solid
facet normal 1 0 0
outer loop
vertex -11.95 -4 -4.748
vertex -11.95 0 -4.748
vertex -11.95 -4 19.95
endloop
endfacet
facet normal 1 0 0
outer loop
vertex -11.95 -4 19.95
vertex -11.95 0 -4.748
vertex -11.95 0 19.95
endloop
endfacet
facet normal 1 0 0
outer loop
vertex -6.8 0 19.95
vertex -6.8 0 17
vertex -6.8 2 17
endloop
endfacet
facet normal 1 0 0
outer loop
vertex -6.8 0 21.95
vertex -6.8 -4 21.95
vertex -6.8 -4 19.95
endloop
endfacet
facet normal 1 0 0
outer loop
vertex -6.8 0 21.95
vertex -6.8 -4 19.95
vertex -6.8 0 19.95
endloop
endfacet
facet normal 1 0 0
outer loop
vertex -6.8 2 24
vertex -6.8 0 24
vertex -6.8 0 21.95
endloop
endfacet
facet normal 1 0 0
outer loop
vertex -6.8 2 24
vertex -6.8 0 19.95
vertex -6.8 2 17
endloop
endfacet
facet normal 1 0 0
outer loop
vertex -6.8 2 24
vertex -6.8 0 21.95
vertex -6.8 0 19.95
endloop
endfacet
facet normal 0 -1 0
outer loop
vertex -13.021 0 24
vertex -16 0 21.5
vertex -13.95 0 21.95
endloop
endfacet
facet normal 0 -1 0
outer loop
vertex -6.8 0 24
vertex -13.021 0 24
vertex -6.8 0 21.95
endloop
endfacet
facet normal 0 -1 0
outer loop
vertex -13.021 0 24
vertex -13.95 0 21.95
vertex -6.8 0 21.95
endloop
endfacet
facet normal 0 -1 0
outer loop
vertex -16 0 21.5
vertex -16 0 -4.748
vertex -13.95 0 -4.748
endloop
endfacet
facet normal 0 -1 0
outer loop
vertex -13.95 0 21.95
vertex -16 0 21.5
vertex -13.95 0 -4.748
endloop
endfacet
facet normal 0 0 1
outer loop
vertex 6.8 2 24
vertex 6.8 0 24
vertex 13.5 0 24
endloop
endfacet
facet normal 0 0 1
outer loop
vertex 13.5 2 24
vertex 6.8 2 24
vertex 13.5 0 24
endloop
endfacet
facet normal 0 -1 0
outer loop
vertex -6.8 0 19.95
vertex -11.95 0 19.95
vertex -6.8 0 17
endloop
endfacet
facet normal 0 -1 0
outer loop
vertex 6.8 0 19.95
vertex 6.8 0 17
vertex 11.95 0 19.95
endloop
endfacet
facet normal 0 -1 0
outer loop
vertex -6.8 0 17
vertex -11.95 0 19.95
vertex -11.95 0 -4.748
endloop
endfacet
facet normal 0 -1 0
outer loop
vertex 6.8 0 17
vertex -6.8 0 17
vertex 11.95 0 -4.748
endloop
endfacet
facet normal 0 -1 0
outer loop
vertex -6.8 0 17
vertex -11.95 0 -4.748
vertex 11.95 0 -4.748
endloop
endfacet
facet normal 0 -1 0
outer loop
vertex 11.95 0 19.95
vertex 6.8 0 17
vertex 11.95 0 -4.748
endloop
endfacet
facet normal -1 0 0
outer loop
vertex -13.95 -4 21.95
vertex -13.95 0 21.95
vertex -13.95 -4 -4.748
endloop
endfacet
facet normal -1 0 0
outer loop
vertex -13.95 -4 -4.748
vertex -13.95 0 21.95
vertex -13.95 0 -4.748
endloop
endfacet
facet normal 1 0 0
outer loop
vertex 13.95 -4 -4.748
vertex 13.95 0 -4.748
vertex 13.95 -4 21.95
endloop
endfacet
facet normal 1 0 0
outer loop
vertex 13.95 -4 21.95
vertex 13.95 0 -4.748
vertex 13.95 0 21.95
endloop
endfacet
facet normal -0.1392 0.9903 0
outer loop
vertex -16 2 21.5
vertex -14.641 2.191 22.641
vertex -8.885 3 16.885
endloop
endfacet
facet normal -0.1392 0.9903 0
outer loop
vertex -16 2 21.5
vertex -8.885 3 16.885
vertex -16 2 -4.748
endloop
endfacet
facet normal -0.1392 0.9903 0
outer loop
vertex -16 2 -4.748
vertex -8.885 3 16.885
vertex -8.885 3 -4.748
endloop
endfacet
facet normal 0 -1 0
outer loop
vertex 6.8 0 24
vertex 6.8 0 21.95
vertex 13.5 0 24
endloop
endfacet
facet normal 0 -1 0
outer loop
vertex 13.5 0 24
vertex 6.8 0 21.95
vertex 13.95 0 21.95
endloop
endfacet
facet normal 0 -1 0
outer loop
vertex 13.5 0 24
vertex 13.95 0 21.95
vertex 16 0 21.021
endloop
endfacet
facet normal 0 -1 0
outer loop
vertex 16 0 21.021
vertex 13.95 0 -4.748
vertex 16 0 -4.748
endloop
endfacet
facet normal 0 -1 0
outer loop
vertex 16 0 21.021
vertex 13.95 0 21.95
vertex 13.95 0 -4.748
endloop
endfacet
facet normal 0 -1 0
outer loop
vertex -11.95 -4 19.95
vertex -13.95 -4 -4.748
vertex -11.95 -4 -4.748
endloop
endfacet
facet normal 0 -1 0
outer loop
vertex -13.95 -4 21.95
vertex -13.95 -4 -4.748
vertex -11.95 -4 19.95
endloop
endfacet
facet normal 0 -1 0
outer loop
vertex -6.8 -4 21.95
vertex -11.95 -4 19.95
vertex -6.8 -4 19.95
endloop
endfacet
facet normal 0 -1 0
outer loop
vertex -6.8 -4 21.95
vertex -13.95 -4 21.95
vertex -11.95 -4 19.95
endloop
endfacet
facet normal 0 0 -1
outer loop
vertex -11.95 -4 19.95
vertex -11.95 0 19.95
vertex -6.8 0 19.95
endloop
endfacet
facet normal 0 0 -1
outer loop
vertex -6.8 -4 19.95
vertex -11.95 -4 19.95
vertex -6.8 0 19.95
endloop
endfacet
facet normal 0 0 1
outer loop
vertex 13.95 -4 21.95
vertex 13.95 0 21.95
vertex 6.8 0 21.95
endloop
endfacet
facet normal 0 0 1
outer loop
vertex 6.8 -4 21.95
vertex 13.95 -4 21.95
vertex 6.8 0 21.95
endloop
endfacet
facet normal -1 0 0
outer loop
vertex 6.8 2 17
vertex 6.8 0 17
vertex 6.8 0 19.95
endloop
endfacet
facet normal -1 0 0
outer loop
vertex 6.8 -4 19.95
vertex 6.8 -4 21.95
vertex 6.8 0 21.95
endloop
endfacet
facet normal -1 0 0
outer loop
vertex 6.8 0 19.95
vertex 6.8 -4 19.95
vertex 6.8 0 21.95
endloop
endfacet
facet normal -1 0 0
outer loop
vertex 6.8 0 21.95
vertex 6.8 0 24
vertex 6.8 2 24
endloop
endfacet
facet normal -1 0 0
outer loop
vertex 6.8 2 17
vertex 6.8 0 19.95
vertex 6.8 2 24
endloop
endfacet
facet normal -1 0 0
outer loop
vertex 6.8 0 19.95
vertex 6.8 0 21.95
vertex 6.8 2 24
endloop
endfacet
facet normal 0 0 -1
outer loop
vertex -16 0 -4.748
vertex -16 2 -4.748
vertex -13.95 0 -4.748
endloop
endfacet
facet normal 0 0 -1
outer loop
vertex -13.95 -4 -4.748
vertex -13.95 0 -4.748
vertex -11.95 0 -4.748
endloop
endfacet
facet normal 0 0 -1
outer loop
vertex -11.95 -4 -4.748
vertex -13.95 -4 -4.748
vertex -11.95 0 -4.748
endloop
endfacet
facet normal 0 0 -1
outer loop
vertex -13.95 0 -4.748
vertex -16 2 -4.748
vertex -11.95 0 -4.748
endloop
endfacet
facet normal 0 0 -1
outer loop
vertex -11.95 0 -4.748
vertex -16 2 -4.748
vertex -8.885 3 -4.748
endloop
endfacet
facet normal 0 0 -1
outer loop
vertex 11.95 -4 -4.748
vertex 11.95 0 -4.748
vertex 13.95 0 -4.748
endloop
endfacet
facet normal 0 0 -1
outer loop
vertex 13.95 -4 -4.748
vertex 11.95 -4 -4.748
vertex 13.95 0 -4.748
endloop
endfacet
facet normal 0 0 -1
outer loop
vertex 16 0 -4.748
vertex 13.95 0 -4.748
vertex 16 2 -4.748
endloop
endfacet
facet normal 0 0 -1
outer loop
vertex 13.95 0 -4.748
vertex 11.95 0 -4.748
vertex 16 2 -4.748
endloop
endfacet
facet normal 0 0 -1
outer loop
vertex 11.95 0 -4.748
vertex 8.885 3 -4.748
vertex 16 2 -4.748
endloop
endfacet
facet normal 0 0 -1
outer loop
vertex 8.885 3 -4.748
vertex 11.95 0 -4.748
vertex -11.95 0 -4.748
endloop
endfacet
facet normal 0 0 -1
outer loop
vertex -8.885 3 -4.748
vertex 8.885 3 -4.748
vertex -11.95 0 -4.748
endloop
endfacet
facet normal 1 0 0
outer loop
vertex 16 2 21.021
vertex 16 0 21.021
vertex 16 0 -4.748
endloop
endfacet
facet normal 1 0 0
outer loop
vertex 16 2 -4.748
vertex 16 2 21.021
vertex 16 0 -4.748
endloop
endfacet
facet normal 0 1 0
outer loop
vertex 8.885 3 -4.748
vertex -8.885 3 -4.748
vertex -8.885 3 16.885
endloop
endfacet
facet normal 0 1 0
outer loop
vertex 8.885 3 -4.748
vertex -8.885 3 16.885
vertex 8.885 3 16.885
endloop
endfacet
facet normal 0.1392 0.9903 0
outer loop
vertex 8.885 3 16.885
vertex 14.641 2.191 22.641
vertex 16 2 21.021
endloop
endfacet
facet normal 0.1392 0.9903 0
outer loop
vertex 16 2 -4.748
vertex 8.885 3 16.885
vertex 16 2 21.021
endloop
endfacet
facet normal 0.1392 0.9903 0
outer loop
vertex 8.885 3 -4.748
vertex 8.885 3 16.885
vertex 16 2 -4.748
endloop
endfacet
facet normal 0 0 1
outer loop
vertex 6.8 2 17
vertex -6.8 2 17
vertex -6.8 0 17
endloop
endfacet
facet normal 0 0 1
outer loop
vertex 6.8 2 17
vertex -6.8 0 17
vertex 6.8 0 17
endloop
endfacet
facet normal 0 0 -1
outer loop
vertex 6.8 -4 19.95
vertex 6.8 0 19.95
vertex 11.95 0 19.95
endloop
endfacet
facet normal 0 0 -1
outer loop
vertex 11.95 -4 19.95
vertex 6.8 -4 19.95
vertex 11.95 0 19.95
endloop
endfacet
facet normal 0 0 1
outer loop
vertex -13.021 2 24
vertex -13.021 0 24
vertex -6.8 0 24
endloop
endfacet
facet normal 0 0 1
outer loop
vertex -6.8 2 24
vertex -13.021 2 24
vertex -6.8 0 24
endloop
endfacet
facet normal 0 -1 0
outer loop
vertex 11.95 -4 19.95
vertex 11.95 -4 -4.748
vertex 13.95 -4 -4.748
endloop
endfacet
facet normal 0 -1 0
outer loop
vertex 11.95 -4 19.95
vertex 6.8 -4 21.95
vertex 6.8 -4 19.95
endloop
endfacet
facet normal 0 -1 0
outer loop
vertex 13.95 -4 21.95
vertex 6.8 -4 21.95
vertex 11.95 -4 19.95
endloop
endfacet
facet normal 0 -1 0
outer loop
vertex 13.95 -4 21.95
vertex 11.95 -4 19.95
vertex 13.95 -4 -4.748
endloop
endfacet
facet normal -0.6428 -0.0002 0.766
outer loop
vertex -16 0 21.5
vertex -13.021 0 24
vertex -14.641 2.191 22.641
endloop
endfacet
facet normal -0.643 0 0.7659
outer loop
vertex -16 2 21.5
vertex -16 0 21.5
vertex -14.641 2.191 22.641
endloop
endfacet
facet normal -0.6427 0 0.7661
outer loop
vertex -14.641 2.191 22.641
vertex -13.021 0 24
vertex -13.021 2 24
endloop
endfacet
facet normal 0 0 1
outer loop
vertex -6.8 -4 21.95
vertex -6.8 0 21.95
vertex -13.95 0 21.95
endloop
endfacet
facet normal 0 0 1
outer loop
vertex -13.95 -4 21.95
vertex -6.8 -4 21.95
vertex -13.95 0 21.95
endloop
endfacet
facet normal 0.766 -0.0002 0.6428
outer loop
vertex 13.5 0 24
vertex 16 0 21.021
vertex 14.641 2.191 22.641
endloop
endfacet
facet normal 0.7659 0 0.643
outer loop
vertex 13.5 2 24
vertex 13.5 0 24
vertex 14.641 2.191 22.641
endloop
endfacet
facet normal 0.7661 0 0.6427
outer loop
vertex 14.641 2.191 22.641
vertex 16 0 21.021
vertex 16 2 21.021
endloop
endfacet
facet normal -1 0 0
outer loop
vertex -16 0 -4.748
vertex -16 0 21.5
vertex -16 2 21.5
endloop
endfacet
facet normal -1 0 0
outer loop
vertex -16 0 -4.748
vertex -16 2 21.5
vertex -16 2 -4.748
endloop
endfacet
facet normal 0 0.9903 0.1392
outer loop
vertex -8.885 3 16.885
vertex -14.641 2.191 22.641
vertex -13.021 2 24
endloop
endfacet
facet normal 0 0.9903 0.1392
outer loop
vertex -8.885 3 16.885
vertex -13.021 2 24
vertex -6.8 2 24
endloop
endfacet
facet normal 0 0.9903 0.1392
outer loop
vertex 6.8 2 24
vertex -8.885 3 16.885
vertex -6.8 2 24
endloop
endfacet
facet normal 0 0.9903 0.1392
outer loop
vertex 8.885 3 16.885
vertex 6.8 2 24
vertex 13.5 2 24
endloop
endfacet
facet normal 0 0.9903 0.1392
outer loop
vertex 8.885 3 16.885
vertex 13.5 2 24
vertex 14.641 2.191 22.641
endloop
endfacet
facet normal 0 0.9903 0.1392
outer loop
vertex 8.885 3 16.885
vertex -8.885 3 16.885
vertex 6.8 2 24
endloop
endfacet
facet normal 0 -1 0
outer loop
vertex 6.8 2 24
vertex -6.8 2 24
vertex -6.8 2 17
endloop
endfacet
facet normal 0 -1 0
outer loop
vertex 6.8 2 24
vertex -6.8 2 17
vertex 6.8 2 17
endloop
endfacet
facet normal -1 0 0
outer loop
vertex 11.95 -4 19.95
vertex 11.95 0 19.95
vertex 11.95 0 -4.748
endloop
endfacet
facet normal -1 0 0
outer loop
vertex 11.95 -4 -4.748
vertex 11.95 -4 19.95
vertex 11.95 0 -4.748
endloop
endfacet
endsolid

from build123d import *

# Parameters (mm, degrees)
SKETCH1_W             = 32
SKETCH1_H             = 48
BOSS_EXTRUDE1_DEPTH   = 3
BOSS_EXTRUDE2_DEPTH   = 4
CHAMFER1_SIZE         = 1
CHAMFER1_SIZE2        = 7.115369722
CHAMFER1_PART_2_SIZE  = 1
CHAMFER1_PART_2_SIZE2 = 7.115369722
CHAMFER2_SIZE         = 1
CHAMFER2_SIZE2        = 7.115369722
CHAMFER2_PART_2_SIZE  = 1
CHAMFER2_PART_2_SIZE2 = 7.115369722
SKETCH4_W             = 13.6
SKETCH4_H             = 2
CUT_EXTRUDE2_DEPTH    = 7
CHAMFER4_SIZE         = 2.5
CHAMFER4_SIZE2        = 2.979383981
CHAMFER4_PART_2_SIZE  = 2.5
CHAMFER4_PART_2_SIZE2 = 2.979383981
CHAMFER5_SIZE         = 2.5
SKETCH5_W             = 45.346149297
SKETCH5_H             = 21.744132288
CUT_EXTRUDE3_DEPTH    = 10


with BuildPart() as part:
    # Sketch1 → Boss-Extrude1 (new body)
    with BuildSketch(Plane(origin=(0, 0, 0), x_dir=(1, 0, 0), z_dir=(0, 1, 0))):
        Rectangle(SKETCH1_W, SKETCH1_H)
    extrude(amount=BOSS_EXTRUDE1_DEPTH)

    # Sketch2 → Boss-Extrude2 (add)
    with BuildSketch(Plane.XZ):
        Polygon((-13.95, -21.95), (-11.95, -21.95), (-11.95, -19.95), (-11.95, 19.95), (-6.8, 19.95), (-6.8, 21.95), (-13.95, 21.95), align=None)
        Polygon((11.95, -19.95), (11.95, -21.95), (13.95, -21.95), (13.95, 21.95), (6.8, 21.95), (6.8, 19.95), (11.95, 19.95), align=None)
    extrude(amount=BOSS_EXTRUDE2_DEPTH)

    # Chamfer1
    chamfer1_edges = [part.edges().sort_by_distance(p)[0] for p in [
        (0, 3, 24),
    ]]
    chamfer1_side = [part.faces().sort_by_distance(p)[0] for p in [
        (0, 1.5, 24),
    ]]
    chamfer(chamfer1_edges, length=CHAMFER1_SIZE, length2=CHAMFER1_SIZE2, reference=chamfer1_side[0])

    # Chamfer1 part 2
    chamfer1_part_2_edges = [part.edges().sort_by_distance(p)[0] for p in [
        (0, 3, -24),
    ]]
    chamfer1_part_2_side = [part.faces().sort_by_distance(p)[0] for p in [
        (0, 1.5, -24),
    ]]
    chamfer(chamfer1_part_2_edges, length=CHAMFER1_PART_2_SIZE, length2=CHAMFER1_PART_2_SIZE2, reference=chamfer1_part_2_side[0])

    # Chamfer2
    chamfer2_edges = [part.edges().sort_by_distance(p)[0] for p in [
        (16, 3, 0),
    ]]
    chamfer2_side = [part.faces().sort_by_distance(p)[0] for p in [
        (16, 1.439355758, 0),
    ]]
    chamfer(chamfer2_edges, length=CHAMFER2_SIZE, length2=CHAMFER2_SIZE2, reference=chamfer2_side[0])

    # Chamfer2 part 2
    chamfer2_part_2_edges = [part.edges().sort_by_distance(p)[0] for p in [
        (-16, 3, 0),
    ]]
    chamfer2_part_2_side = [part.faces().sort_by_distance(p)[0] for p in [
        (-16, 1.439355758, 0),
    ]]
    chamfer(chamfer2_part_2_edges, length=CHAMFER2_PART_2_SIZE, length2=CHAMFER2_PART_2_SIZE2, reference=chamfer2_part_2_side[0])

    # Sketch4 → Cut-Extrude2 (cut)
    with BuildSketch(Plane.XY.offset(24)):
        with Locations((0, 1)):
            Rectangle(SKETCH4_W, SKETCH4_H)
    extrude(amount=-CUT_EXTRUDE2_DEPTH, mode=Mode.SUBTRACT)

    # Chamfer4
    chamfer4_edges = [part.edges().sort_by_distance(p)[0] for p in [
        (16, 1, 24),
    ]]
    chamfer4_side = [part.faces().sort_by_distance(p)[0] for p in [
        (11.4, 1, 24),
    ]]
    chamfer(chamfer4_edges, length=CHAMFER4_SIZE, length2=CHAMFER4_SIZE2, reference=chamfer4_side[0])

    # Chamfer4 part 2
    chamfer4_part_2_edges = [part.edges().sort_by_distance(p)[0] for p in [
        (-16, 1, 24),
    ]]
    chamfer4_part_2_side = [part.faces().sort_by_distance(p)[0] for p in [
        (-16, 1, 0),
    ]]
    chamfer(chamfer4_part_2_edges, length=CHAMFER4_PART_2_SIZE, length2=CHAMFER4_PART_2_SIZE2, reference=chamfer4_part_2_side[0])

    # Chamfer5
    chamfer5_edges = [part.edges().sort_by_distance(p)[0] for p in [
        (16, 1, -24),
        (-16, 1, -24),
    ]]
    chamfer(chamfer5_edges, length=CHAMFER5_SIZE)

    # Sketch5 → Cut-Extrude3 (cut)
    with BuildSketch(Plane(origin=(0, 3, 0), x_dir=(1, 0, 0), z_dir=(0, 1, 0))):
        with Locations((0.997752906, 15.619993764)):
            Rectangle(SKETCH5_W, SKETCH5_H)
    extrude(amount=-CUT_EXTRUDE3_DEPTH, mode=Mode.SUBTRACT)


solid = part.part
